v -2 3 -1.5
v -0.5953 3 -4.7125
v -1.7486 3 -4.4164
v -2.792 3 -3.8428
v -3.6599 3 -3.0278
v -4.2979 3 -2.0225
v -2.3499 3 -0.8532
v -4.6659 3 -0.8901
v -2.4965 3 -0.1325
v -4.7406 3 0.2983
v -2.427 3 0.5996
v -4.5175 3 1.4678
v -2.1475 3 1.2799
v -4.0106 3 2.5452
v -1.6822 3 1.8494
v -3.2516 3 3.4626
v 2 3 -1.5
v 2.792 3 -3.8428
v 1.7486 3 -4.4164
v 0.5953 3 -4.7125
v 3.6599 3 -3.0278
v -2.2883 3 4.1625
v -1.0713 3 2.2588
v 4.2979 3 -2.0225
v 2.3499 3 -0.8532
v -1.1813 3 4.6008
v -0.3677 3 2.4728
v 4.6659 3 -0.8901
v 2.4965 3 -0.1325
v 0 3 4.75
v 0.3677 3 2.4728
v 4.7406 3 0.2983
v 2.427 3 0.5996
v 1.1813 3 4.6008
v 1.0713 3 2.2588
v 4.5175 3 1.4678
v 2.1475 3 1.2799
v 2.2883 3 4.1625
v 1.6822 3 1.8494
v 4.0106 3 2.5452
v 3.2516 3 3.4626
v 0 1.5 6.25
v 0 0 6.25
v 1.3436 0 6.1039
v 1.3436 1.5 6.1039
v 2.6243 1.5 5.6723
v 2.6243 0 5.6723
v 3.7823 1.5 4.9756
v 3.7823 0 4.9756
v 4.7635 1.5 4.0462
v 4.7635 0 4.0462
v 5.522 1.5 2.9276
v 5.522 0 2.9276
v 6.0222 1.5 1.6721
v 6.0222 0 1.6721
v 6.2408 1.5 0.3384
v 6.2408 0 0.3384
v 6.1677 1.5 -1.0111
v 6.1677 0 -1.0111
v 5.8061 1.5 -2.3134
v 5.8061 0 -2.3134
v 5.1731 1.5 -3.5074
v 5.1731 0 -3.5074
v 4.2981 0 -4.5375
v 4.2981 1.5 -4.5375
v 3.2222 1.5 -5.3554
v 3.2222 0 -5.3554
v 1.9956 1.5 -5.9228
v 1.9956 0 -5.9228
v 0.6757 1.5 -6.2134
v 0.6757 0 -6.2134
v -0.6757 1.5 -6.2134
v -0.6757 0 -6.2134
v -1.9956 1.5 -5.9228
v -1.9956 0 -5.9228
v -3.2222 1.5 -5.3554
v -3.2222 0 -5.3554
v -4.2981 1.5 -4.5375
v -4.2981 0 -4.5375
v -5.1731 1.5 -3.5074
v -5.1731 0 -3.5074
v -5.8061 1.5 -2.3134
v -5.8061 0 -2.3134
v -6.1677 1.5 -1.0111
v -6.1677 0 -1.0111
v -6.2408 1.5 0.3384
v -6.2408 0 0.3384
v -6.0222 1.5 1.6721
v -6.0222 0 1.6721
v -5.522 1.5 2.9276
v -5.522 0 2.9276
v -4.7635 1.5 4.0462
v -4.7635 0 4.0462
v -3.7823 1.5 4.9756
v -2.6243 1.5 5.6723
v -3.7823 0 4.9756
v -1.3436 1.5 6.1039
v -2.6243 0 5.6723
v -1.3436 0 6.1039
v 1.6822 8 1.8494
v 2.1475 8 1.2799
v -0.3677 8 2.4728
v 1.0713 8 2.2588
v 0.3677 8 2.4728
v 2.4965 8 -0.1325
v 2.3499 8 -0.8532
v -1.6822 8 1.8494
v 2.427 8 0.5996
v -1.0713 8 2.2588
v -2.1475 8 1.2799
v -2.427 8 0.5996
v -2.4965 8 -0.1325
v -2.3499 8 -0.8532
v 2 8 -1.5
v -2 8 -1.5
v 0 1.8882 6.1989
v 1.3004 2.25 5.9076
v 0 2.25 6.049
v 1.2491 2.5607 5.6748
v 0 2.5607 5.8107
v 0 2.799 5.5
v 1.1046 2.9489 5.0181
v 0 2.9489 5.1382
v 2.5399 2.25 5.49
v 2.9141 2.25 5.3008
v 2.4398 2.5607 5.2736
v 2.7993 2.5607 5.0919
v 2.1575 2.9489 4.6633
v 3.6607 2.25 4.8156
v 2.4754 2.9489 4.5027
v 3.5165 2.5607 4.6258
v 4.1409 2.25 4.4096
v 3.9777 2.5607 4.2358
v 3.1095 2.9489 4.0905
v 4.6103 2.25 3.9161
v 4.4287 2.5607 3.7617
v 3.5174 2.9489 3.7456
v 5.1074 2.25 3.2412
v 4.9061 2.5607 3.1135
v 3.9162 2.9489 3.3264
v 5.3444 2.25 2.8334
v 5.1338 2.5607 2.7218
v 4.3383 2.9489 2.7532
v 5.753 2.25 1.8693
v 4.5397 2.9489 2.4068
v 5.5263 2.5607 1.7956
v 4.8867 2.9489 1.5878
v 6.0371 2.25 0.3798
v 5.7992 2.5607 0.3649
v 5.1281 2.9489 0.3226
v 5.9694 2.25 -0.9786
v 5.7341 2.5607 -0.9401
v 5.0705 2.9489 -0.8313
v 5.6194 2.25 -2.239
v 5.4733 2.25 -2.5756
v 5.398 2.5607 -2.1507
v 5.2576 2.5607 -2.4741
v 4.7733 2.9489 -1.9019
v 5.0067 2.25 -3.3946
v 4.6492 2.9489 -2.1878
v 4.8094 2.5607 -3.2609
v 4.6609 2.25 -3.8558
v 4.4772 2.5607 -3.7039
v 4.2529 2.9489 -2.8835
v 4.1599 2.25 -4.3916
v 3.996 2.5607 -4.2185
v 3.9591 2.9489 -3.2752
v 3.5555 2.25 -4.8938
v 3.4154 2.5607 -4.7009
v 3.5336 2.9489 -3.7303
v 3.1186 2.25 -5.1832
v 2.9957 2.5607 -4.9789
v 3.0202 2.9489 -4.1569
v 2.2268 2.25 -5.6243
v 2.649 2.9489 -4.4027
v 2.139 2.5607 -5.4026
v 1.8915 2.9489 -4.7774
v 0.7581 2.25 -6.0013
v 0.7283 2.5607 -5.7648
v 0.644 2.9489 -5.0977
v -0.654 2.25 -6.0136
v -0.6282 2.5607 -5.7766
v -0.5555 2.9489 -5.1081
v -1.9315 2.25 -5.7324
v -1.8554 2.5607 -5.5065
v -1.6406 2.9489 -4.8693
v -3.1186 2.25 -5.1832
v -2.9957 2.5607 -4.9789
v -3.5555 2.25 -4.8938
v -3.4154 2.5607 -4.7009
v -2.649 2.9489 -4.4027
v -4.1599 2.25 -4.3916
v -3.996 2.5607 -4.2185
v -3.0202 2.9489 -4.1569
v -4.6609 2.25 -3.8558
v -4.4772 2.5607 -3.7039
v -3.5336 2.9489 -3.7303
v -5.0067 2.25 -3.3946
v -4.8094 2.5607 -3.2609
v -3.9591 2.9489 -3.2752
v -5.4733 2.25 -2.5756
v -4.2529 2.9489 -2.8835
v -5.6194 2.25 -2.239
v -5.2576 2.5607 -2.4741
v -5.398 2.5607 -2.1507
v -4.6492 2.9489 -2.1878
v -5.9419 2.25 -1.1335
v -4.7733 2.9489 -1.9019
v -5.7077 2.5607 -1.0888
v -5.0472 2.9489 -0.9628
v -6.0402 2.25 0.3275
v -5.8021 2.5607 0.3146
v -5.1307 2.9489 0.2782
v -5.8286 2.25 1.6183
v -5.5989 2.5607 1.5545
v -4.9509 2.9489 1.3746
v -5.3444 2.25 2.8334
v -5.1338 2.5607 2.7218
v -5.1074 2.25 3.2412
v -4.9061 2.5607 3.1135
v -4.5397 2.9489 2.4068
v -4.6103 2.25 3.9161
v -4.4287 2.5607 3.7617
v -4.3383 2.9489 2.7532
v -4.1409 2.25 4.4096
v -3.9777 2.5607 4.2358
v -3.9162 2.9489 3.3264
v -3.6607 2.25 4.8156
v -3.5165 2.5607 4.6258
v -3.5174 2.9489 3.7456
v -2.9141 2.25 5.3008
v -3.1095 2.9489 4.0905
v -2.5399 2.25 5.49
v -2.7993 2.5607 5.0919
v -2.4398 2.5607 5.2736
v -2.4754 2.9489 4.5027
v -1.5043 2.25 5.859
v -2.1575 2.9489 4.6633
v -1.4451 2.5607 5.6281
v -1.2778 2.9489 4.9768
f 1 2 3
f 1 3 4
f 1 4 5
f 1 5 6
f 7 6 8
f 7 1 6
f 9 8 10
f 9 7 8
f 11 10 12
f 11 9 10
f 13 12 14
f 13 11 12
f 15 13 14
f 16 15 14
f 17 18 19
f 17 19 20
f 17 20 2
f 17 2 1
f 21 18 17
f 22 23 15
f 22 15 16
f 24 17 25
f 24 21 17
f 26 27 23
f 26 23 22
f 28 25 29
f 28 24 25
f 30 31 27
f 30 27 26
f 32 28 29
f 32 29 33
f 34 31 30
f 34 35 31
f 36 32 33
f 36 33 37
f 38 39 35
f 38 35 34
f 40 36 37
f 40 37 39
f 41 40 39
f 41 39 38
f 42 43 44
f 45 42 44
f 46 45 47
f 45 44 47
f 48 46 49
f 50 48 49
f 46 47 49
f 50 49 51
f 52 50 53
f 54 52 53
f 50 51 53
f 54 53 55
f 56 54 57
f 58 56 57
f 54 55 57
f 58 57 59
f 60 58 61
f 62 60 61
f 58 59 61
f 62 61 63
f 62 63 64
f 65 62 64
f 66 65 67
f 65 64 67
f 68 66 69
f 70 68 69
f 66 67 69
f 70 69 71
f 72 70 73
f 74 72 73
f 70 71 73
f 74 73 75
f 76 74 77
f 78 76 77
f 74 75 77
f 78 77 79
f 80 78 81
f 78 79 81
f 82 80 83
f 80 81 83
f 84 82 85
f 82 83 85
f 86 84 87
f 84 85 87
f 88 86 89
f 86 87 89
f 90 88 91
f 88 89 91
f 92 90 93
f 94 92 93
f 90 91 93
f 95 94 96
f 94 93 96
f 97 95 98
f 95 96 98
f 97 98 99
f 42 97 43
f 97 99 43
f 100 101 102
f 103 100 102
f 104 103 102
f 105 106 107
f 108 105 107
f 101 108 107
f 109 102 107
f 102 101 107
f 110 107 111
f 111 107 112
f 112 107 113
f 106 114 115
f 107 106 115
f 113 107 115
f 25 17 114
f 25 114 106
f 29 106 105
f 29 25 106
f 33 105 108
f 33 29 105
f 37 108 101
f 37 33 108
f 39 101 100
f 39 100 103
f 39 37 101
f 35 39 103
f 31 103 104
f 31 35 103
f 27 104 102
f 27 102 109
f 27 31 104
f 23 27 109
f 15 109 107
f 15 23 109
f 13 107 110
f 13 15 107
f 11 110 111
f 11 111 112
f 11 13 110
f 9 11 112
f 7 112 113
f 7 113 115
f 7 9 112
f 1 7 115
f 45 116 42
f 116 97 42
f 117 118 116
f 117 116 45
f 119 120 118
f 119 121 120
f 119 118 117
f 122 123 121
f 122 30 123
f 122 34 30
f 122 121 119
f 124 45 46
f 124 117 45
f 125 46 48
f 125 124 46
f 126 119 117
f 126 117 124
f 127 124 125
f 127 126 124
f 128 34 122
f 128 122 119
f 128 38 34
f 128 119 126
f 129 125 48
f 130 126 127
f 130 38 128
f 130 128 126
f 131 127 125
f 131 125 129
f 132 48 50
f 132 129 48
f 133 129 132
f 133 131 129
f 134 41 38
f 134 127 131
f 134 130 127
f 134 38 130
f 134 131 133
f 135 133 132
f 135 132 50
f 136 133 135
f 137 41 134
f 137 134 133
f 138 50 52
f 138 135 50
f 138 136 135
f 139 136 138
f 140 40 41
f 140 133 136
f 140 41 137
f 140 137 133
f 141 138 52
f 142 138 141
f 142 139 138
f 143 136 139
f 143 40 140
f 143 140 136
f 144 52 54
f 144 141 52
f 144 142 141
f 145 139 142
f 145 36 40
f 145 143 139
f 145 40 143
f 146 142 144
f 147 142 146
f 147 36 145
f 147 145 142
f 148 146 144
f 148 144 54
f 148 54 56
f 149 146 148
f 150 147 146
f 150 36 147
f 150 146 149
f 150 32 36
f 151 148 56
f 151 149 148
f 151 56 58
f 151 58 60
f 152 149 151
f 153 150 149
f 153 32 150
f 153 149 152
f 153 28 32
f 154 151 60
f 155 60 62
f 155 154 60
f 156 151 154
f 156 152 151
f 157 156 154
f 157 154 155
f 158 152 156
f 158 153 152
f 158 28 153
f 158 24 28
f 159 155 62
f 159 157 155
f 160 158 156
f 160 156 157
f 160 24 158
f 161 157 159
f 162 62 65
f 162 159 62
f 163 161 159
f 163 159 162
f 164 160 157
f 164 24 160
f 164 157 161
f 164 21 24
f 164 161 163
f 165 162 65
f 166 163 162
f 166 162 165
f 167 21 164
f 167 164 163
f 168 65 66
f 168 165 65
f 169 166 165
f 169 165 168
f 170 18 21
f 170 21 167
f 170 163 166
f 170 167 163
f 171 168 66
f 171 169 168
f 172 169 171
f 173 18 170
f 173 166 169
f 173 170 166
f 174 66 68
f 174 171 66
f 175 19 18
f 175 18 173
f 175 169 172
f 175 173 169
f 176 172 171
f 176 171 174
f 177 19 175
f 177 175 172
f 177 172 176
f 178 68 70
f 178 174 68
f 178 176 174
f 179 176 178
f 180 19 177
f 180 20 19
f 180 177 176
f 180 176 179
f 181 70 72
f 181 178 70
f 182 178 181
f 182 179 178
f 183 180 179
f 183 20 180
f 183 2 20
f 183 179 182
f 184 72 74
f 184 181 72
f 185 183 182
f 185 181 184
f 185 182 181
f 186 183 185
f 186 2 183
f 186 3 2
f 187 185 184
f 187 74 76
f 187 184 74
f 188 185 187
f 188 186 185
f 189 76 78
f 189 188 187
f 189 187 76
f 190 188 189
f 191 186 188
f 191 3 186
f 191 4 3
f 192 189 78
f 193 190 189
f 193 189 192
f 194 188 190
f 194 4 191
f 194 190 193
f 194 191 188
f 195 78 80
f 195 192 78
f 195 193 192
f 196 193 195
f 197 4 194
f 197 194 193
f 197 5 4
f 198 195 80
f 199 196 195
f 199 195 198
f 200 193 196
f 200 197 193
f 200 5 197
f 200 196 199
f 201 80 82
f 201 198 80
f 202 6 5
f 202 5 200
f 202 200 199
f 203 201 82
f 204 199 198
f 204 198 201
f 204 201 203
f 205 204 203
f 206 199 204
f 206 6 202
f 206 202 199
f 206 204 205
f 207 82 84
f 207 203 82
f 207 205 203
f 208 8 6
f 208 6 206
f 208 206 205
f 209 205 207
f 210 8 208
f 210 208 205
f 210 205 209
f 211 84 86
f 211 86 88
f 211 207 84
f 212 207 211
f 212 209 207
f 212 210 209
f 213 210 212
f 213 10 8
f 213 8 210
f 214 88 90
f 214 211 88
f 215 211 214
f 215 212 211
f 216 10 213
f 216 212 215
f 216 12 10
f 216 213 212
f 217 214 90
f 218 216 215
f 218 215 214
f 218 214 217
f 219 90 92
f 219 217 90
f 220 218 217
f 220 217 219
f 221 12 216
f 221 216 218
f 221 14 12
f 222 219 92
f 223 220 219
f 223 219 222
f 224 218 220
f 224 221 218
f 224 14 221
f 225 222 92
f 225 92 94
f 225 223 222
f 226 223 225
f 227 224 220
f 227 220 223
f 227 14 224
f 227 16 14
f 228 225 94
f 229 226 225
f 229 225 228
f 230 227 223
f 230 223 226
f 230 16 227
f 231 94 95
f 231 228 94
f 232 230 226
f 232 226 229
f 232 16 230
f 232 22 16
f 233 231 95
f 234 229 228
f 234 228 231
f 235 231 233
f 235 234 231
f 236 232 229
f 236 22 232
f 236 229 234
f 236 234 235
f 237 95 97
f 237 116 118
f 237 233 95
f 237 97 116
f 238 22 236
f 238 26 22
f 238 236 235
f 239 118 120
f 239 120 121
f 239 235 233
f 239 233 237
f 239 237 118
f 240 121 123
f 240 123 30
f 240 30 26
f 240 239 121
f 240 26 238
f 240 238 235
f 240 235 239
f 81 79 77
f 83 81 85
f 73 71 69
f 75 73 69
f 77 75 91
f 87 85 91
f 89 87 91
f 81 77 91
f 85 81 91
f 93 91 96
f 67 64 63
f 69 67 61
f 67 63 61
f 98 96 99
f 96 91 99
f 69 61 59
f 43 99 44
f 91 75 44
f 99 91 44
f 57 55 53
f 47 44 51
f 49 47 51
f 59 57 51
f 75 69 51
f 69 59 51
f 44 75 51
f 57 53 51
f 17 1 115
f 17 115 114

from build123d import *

# Parameters (mm, degrees)
SKETCH1_R           = 6.25
BOSS_EXTRUDE1_DEPTH = 3
BOSS_EXTRUDE2_DEPTH = 5
FILLET1_R           = 1.5


with BuildPart() as part:
    # Sketch1 → Boss-Extrude1 (new body)
    with BuildSketch(Plane(origin=(0, 0, 0), x_dir=(1, 0, 0), z_dir=(0, 1, 0))):
        with Locations(Location((0, 0, 0), (0, 0, 270))):
            Circle(SKETCH1_R)
    extrude(amount=BOSS_EXTRUDE1_DEPTH)

    # Sketch2 → Boss-Extrude2 (add)
    with BuildSketch(Plane(origin=(0, 3, 0), x_dir=(1, 0, 0), z_dir=(0, 1, 0))):
        with BuildLine():
            Line((-2, 1.5), (2, 1.5))
            ThreePointArc((2, 1.5), (0, -2.5), (-2, 1.5))
        make_face()
    extrude(amount=BOSS_EXTRUDE2_DEPTH)

    # Fillet1
    fillet1_edges = [part.edges().sort_by_distance(p)[0] for p in [
        (0, 3, -6.25),
    ]]
    fillet(fillet1_edges, radius=FILLET1_R)


solid = part.part
